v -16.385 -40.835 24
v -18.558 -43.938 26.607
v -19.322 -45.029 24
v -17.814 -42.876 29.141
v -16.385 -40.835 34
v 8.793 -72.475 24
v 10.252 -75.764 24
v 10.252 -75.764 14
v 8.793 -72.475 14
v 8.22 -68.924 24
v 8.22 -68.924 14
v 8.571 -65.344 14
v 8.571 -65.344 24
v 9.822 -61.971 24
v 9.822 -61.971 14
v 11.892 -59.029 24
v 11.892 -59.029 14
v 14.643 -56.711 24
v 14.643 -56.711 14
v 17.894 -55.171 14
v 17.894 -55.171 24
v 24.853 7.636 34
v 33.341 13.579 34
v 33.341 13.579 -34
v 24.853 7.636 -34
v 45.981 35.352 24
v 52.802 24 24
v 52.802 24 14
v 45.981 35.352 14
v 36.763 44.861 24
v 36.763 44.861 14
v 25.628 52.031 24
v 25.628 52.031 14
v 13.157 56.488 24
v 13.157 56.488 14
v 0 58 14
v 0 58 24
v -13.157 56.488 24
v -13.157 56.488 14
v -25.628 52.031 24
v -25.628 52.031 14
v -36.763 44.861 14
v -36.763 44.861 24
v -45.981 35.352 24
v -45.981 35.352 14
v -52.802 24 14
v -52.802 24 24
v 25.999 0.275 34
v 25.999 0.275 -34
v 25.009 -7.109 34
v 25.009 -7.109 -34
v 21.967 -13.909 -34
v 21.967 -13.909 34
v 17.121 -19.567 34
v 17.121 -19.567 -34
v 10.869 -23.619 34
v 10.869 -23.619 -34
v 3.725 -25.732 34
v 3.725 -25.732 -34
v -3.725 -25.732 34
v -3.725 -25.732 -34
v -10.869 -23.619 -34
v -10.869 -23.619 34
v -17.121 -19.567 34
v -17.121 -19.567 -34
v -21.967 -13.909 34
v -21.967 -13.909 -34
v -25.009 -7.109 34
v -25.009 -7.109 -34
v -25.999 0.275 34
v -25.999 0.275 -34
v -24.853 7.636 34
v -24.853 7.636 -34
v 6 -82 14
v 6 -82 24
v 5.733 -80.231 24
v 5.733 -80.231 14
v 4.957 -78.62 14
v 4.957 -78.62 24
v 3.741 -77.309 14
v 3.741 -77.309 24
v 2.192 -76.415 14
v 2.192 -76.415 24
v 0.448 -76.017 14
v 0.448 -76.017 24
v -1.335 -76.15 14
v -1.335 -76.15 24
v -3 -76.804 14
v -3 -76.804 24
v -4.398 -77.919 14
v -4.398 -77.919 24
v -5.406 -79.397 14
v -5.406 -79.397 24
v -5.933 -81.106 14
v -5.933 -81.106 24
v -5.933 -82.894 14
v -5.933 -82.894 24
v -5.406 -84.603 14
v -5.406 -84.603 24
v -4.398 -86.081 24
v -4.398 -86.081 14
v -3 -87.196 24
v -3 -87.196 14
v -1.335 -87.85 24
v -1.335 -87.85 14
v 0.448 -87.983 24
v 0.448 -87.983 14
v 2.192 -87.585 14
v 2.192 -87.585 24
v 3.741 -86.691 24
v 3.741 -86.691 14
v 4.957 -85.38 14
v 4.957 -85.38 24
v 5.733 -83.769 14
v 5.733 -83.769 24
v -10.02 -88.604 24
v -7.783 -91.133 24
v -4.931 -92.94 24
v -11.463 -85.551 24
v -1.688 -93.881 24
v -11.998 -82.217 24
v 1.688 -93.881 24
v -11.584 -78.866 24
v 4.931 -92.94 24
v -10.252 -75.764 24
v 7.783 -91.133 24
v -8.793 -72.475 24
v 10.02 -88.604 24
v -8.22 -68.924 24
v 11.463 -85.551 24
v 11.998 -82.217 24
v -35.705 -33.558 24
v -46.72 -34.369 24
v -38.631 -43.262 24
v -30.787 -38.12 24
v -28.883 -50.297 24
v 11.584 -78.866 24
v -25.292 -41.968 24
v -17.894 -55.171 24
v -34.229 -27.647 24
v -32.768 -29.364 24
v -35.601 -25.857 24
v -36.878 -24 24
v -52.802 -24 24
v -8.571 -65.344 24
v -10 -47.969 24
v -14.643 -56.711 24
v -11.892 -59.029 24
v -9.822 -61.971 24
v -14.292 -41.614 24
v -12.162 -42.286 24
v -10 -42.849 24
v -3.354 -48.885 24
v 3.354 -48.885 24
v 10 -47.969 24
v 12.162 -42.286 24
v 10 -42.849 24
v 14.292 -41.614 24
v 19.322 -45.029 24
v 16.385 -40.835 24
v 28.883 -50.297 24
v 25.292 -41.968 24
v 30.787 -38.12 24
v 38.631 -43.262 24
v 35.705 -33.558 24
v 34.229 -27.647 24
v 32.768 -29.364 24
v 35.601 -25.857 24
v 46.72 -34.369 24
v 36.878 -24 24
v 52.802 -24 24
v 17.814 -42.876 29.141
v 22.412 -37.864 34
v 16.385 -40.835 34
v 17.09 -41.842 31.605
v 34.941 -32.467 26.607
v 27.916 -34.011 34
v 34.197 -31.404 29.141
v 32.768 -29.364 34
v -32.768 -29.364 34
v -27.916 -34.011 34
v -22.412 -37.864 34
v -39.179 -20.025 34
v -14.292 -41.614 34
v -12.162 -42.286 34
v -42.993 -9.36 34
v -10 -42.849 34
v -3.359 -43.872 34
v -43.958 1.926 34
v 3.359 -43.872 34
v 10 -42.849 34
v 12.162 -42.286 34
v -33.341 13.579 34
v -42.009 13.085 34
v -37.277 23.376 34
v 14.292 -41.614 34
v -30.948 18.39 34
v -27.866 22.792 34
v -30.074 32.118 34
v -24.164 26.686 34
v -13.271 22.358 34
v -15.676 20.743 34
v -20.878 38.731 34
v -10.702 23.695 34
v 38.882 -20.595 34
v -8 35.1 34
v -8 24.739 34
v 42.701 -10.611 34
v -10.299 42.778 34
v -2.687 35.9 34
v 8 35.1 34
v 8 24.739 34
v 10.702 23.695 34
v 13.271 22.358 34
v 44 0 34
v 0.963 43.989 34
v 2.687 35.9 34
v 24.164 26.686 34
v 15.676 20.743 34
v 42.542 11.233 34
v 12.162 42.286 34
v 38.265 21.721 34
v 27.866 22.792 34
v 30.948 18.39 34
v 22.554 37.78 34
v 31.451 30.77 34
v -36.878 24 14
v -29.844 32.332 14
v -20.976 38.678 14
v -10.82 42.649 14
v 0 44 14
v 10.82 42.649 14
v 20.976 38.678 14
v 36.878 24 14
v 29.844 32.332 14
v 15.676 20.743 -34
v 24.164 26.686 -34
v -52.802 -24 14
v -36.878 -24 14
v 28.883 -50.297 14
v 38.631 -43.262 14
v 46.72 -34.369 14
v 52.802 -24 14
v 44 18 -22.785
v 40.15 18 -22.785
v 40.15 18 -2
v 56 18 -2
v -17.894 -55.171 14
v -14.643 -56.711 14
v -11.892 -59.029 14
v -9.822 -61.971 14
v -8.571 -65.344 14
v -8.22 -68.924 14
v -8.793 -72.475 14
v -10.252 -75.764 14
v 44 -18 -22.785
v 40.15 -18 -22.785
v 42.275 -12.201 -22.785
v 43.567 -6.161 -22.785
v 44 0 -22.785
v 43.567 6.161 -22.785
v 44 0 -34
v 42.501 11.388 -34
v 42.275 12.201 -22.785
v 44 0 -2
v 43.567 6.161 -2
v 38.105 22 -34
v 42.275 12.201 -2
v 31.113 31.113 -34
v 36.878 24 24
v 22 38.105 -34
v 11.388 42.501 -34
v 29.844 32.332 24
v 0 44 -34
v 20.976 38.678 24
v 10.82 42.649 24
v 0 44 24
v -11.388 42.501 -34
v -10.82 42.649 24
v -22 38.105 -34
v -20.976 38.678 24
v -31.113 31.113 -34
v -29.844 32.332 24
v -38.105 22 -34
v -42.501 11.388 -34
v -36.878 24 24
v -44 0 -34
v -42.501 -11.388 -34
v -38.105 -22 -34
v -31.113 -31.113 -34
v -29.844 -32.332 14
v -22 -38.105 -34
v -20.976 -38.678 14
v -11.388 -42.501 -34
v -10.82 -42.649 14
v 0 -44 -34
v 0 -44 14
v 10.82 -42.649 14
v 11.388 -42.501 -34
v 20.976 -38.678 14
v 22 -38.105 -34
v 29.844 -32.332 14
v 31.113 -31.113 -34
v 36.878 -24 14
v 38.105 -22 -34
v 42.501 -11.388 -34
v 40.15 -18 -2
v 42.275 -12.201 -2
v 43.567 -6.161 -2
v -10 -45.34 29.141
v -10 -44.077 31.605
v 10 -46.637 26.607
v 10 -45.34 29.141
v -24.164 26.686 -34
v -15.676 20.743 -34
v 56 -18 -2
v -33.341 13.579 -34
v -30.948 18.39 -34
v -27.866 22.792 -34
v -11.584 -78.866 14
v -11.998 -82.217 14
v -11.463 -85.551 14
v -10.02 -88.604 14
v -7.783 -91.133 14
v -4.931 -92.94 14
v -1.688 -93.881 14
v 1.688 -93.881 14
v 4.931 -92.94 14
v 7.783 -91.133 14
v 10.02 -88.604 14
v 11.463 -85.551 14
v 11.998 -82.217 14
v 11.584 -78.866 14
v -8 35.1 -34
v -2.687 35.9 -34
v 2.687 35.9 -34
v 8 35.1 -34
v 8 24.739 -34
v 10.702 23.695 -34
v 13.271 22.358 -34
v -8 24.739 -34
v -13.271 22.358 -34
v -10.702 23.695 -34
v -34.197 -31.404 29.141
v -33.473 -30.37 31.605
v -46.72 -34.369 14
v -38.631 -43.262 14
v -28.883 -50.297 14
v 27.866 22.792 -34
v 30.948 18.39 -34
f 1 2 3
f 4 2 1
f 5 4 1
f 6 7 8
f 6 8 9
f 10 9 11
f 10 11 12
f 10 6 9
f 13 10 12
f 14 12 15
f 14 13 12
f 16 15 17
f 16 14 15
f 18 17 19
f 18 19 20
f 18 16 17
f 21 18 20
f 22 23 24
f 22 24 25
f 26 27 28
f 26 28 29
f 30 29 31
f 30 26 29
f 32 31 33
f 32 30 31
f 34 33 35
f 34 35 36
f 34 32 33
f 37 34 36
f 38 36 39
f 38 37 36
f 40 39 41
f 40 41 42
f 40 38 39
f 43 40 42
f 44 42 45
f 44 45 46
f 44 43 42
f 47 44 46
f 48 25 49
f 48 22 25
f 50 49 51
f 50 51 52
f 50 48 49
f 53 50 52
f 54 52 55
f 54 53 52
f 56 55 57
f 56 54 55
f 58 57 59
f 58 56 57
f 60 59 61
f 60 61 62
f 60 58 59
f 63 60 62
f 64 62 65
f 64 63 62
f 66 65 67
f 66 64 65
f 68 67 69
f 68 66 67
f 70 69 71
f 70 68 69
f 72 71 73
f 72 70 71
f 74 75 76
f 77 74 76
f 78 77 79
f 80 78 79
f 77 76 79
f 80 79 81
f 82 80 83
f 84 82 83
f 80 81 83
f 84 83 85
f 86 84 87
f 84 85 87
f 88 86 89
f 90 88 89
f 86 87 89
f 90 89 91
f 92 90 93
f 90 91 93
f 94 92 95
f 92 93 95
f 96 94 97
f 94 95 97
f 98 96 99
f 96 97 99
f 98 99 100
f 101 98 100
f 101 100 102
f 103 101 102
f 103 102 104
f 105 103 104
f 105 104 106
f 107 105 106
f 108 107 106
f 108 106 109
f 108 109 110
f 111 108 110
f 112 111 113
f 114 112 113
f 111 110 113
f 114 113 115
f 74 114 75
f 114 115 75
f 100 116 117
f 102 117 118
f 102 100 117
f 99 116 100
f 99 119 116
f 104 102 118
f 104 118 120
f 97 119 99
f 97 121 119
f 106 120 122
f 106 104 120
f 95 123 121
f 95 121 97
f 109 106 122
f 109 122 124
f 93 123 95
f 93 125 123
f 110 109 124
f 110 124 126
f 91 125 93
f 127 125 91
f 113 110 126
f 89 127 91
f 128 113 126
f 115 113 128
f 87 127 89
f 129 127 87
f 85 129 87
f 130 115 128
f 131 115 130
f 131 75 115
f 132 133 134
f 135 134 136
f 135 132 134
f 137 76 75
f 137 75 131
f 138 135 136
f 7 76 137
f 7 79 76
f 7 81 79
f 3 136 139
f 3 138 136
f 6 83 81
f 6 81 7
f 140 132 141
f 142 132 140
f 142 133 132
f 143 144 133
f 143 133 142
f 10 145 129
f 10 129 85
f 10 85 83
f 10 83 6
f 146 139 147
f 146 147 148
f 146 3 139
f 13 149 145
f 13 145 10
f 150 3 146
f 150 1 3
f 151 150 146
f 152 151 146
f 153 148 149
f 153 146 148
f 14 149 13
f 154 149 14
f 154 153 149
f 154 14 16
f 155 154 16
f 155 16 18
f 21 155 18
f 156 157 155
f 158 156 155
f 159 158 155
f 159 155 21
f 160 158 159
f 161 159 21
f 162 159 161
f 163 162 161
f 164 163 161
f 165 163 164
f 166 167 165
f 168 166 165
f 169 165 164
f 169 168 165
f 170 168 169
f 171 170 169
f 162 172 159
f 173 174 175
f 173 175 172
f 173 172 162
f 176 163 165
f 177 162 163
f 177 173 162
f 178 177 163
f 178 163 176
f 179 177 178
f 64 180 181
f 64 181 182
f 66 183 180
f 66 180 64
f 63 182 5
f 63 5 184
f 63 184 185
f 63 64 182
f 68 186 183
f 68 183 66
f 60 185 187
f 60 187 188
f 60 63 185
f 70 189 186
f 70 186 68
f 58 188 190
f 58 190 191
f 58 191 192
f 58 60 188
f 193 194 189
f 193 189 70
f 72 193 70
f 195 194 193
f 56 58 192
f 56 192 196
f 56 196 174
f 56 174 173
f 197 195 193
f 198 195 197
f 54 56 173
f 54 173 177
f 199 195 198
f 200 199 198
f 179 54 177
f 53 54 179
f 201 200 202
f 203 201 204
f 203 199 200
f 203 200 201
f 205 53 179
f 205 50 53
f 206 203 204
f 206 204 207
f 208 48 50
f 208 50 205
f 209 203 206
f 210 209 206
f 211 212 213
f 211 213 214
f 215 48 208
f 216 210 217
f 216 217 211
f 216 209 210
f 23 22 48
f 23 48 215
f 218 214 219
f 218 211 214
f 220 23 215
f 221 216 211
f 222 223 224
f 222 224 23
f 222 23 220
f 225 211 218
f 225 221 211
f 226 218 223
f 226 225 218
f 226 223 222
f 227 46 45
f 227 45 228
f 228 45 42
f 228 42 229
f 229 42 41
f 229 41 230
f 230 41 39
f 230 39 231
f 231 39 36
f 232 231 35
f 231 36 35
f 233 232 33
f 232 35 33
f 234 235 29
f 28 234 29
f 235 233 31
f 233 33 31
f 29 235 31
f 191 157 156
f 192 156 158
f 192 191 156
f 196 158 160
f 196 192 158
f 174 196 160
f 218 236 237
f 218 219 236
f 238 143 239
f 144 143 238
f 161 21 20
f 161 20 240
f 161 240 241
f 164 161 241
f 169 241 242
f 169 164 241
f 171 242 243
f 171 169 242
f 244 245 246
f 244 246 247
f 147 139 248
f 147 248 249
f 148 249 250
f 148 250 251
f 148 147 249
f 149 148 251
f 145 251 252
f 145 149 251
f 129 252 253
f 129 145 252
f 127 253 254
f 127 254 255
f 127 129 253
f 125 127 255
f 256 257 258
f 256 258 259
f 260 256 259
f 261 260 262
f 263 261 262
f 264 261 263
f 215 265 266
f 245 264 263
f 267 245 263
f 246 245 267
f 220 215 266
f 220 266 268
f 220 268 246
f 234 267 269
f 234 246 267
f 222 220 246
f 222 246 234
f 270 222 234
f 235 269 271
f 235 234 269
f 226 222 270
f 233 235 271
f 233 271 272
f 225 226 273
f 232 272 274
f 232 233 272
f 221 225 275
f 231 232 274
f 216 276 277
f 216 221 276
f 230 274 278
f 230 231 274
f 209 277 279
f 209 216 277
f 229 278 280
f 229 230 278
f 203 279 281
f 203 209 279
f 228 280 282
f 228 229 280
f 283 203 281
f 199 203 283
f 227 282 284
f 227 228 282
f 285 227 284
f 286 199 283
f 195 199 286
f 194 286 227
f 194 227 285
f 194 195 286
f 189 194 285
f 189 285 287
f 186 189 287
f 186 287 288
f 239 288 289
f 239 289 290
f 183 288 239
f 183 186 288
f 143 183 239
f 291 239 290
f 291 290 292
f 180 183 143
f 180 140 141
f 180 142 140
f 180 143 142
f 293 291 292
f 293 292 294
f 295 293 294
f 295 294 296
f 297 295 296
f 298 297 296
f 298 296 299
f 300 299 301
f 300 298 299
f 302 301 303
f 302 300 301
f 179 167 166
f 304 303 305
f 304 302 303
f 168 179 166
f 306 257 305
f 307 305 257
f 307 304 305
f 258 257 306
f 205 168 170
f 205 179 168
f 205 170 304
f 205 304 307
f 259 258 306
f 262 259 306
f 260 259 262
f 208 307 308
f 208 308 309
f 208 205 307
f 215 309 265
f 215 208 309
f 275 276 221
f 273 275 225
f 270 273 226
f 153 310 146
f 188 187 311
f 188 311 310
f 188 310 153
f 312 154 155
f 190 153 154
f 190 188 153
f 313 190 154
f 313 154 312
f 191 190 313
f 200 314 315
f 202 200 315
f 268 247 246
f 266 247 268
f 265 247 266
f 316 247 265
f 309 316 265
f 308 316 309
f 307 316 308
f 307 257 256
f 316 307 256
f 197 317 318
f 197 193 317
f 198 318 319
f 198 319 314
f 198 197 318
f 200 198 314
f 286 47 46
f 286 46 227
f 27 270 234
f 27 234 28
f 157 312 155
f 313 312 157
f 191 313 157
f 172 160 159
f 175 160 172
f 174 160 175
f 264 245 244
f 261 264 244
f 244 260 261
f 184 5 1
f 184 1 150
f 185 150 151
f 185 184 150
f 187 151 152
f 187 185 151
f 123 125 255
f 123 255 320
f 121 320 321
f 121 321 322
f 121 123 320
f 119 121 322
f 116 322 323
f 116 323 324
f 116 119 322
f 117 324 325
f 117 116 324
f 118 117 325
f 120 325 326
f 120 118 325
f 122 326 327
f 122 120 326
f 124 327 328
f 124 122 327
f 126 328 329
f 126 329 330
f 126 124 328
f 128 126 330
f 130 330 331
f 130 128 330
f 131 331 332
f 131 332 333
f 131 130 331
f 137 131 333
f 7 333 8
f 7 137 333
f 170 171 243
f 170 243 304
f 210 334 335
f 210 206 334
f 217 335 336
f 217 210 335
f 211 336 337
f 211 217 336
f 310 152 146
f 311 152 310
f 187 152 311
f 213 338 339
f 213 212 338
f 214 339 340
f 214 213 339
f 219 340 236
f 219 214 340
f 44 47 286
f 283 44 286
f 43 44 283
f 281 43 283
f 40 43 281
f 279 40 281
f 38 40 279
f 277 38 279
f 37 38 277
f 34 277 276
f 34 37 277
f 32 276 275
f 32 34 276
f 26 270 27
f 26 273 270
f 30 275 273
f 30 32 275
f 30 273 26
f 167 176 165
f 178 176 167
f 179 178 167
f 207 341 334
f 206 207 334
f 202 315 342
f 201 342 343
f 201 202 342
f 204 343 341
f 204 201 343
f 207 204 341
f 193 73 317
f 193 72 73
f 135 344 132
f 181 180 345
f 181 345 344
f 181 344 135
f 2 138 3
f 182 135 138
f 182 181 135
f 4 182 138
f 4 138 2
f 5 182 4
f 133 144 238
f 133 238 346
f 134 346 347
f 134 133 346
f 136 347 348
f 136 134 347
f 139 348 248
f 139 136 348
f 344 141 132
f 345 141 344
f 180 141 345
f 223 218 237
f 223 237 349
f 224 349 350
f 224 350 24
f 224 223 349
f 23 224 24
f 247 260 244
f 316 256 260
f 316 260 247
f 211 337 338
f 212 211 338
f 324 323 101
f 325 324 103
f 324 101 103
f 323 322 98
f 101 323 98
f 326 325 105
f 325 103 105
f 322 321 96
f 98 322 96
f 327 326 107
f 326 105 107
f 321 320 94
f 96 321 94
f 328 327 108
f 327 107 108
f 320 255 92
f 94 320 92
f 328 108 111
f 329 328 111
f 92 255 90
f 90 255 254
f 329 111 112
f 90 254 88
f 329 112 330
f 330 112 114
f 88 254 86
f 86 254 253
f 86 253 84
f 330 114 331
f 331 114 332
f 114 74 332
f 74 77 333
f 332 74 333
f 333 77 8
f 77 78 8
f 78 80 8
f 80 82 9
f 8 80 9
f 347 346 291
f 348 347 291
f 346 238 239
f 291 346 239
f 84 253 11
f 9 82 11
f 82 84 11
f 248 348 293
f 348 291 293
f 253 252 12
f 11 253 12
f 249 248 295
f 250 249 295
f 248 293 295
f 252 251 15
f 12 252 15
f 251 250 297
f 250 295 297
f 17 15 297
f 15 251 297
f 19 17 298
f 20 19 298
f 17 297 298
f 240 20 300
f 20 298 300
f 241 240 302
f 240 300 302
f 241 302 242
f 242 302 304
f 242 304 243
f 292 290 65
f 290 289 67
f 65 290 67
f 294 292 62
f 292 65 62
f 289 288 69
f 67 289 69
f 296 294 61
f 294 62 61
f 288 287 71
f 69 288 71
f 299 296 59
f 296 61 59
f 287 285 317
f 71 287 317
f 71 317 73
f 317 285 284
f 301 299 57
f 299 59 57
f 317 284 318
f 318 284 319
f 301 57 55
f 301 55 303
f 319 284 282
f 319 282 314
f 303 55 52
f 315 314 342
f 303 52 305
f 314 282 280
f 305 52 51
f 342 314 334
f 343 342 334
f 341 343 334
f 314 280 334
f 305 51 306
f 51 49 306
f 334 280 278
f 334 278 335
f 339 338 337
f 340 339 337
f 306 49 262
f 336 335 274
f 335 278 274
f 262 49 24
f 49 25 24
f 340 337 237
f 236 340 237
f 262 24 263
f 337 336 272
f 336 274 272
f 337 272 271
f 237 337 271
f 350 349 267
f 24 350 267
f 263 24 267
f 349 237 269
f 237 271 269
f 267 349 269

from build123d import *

# Parameters (mm, degrees)
F0_R      = 44
F1_DEPTH  = 34
F3_R      = 6
F4_DEPTH  = 10
F5_W      = 12.3737903833
F5_H      = 20.7846096908
F6_DEPTH  = 18
F4_FACE_R = 6
F8_DEPTH  = 10
F12_DEPTH = 107.2


with BuildPart() as f1:
    # F0 (on Top) → F1 (new body, symmetric)
    with BuildSketch(Plane.XY):
        Circle(F0_R)
        with BuildLine():
            ThreePointArc((-15.6760909215, 20.742713743), (-12.0054639441, 23.0622816626), (-8, 24.7386337537))
            Line((-8, 24.7386337537), (-8, 35.0998575496))
            ThreePointArc((-8, 35.0998575496), (0, 36), (8, 35.0998575496))
            Line((8, 35.0998575496), (8, 24.7386337537))
            ThreePointArc((8, 24.7386337537), (12.0054639441, 23.0622816626), (15.6760909215, 20.742713743))
            Line((15.6760909215, 20.742713743), (24.1635085752, 26.685667564))
            ThreePointArc((24.1635085752, 26.685667564), (29.4894735944, 20.6487517086), (33.3407315568, 13.5792348554))
            Line((33.3407315568, 13.5792348554), (24.8533139031, 7.6362810343))
            ThreePointArc((24.8533139031, 7.6362810343), (0, -26), (-24.8533139031, 7.6362810343))
            Line((-24.8533139031, 7.6362810343), (-33.3407315568, 13.5792348554))
            ThreePointArc((-33.3407315568, 13.5792348554), (-29.4894735944, 20.6487517086), (-24.1635085752, 26.685667564))
            Line((-24.1635085752, 26.685667564), (-15.6760909215, 20.742713743))
        make_face(mode=Mode.SUBTRACT)
    extrude(amount=F1_DEPTH, both=True)

    # F3 (on offset) → F4 (join)
    with BuildSketch(Plane.XY.offset(24)):
        with BuildLine():
            Line((-36.8781778292, -24), (-52.8015151298, -24))
            ThreePointArc((-52.8015151298, -24), (-38.6311115614, -43.2624227191), (-17.8938638331, -55.1707317073))
            ThreePointArc((-17.8938638331, -55.1707317073), (-9.0876412514, -63.6171726174), (-10.252187236, -75.7636022514))
            ThreePointArc((-10.252187236, -75.7636022514), (0, -94), (10.252187236, -75.7636022514))
            ThreePointArc((10.252187236, -75.7636022514), (9.0876412514, -63.6171726174), (17.8938638331, -55.1707317073))
            ThreePointArc((17.8938638331, -55.1707317073), (38.6311115614, -43.2624227191), (52.8015151298, -24))
            Line((52.8015151298, -24), (36.8781778292, -24))
            ThreePointArc((36.8781778292, -24), (0, -44), (-36.8781778292, -24))
        make_face()
        with Locations((0, -82)):
            Circle(F3_R, mode=Mode.SUBTRACT)
        with BuildLine():
            Line((-52.8015151298, 24), (-36.8781778292, 24))
            ThreePointArc((-36.8781778292, 24), (0, 44), (36.8781778292, 24))
            Line((36.8781778292, 24), (52.8015151298, 24))
            ThreePointArc((52.8015151298, 24), (0, 58), (-52.8015151298, 24))
        make_face()
    extrude(amount=-F4_DEPTH)

    # F5 (on Front) → F6 (join, symmetric)
    with BuildSketch(Plane.XZ):
        Polygon((56, -2), (44, -2), (44, -22.7846096908), align=None)
        with Locations((37.8131048083, -12.3923048454)):
            Rectangle(F5_W, F5_H)
    extrude(amount=F6_DEPTH, both=True)

    # F7 (on face) + F4_face (on face) → F8 (join, through all)
    with BuildSketch(Plane.XY.offset(34)):
        with BuildLine():
            ThreePointArc((-16.3854099681, -40.8352585418), (-25.2373631994, -36.0426899487), (-32.7684508539, -29.3637298148))
            Line((-32.7684508539, -29.3637298148), (-35.7052592856, -33.5579269227))
            ThreePointArc((-35.7052592856, -33.5579269227), (-28.1052453812, -40.1384501702), (-19.3222183998, -45.0294556497))
            Line((-19.3222183998, -45.0294556497), (-16.3854099681, -40.8352585418))
        make_face()
        with BuildLine():
            ThreePointArc((10, -42.8485705713), (0, -44), (-10, -42.8485705713))
            Line((-10, -42.8485705713), (-10, -47.9687398208))
            ThreePointArc((-10, -47.9687398208), (0, -49), (10, -47.9687398208))
            Line((10, -47.9687398208), (10, -42.8485705713))
        make_face()
        with BuildLine():
            Line((35.7052592856, -33.5579269227), (32.7684508539, -29.3637298148))
            ThreePointArc((32.7684508539, -29.3637298148), (29.1945327607, -32.9192839668), (25.2373631994, -36.0426899487))
            ThreePointArc((25.2373631994, -36.0426899487), (20.948889946, -38.692945223), (16.3854099681, -40.8352585418))
            Line((16.3854099681, -40.8352585418), (19.3222183998, -45.0294556497))
            ThreePointArc((19.3222183998, -45.0294556497), (28.1052453812, -40.1384501702), (35.7052592856, -33.5579269227))
        make_face()
    with BuildSketch(Plane(origin=(0, -50.9642463073, 24), x_dir=(1, 0, 0), z_dir=(0, 0, 1))):
        with BuildLine():
            ThreePointArc((36.8781778292, 26.9642463073), (0, 6.9642463073), (-36.8781778292, 26.9642463073))
            Line((-36.8781778292, 26.9642463073), (-52.8015151298, 26.9642463073))
            ThreePointArc((-52.8015151298, 26.9642463073), (-38.6311115614, 7.7018235881), (-17.8938638331, -4.2064854001))
            ThreePointArc((-17.8938638331, -4.2064854001), (-9.0876412514, -12.6529263101), (-10.252187236, -24.7993559441))
            ThreePointArc((-10.252187236, -24.7993559441), (0, -43.0357536927), (10.252187236, -24.7993559441))
            ThreePointArc((10.252187236, -24.7993559441), (9.0876412514, -12.6529263101), (17.8938638331, -4.2064854001))
            ThreePointArc((17.8938638331, -4.2064854001), (38.6311115614, 7.7018235881), (52.8015151298, 26.9642463073))
            Line((52.8015151298, 26.9642463073), (36.8781778292, 26.9642463073))
        make_face()
        with Locations((0, -31.0357536927)):
            Circle(F4_FACE_R, mode=Mode.SUBTRACT)
    extrude(amount=-F8_DEPTH)

    # F9 (on Right) → F10 (revolve, cut)
    with BuildSketch(Plane.YZ):
        Polygon((-49, 34), (-49, 24), (-44, 34), align=None)
    revolve(axis=Axis((0, 0, 3.8276161067), (0, 0, 1)), mode=Mode.SUBTRACT)

    # F11 (on face) → F12 (cut)
    with BuildSketch(Plane(origin=(0, 0, -34), x_dir=(1, 0, 0), z_dir=(0, 0, -1))):
        with BuildLine():
            ThreePointArc((24.8533139031, -7.6362810343), (0, 26), (-24.8533139031, -7.6362810343))
            Line((-24.8533139031, -7.6362810343), (-33.3407315568, -13.5792348554))
            ThreePointArc((-33.3407315568, -13.5792348554), (-29.4894735944, -20.6487517086), (-24.1635085752, -26.685667564))
            Line((-24.1635085752, -26.685667564), (-15.6760909215, -20.742713743))
            ThreePointArc((-15.6760909215, -20.742713743), (-12.0054639441, -23.0622816626), (-8, -24.7386337537))
            Line((-8, -24.7386337537), (-8, -35.0998575496))
            ThreePointArc((-8, -35.0998575496), (0, -36), (8, -35.0998575496))
            Line((8, -35.0998575496), (8, -24.7386337537))
            ThreePointArc((8, -24.7386337537), (12.0054639441, -23.0622816626), (15.6760909215, -20.742713743))
            Line((15.6760909215, -20.742713743), (24.1635085752, -26.685667564))
            ThreePointArc((24.1635085752, -26.685667564), (29.4894735944, -20.6487517086), (33.3407315568, -13.5792348554))
            Line((33.3407315568, -13.5792348554), (24.8533139031, -7.6362810343))
        make_face()
    extrude(amount=-F12_DEPTH, mode=Mode.SUBTRACT)


solid = f1.part
